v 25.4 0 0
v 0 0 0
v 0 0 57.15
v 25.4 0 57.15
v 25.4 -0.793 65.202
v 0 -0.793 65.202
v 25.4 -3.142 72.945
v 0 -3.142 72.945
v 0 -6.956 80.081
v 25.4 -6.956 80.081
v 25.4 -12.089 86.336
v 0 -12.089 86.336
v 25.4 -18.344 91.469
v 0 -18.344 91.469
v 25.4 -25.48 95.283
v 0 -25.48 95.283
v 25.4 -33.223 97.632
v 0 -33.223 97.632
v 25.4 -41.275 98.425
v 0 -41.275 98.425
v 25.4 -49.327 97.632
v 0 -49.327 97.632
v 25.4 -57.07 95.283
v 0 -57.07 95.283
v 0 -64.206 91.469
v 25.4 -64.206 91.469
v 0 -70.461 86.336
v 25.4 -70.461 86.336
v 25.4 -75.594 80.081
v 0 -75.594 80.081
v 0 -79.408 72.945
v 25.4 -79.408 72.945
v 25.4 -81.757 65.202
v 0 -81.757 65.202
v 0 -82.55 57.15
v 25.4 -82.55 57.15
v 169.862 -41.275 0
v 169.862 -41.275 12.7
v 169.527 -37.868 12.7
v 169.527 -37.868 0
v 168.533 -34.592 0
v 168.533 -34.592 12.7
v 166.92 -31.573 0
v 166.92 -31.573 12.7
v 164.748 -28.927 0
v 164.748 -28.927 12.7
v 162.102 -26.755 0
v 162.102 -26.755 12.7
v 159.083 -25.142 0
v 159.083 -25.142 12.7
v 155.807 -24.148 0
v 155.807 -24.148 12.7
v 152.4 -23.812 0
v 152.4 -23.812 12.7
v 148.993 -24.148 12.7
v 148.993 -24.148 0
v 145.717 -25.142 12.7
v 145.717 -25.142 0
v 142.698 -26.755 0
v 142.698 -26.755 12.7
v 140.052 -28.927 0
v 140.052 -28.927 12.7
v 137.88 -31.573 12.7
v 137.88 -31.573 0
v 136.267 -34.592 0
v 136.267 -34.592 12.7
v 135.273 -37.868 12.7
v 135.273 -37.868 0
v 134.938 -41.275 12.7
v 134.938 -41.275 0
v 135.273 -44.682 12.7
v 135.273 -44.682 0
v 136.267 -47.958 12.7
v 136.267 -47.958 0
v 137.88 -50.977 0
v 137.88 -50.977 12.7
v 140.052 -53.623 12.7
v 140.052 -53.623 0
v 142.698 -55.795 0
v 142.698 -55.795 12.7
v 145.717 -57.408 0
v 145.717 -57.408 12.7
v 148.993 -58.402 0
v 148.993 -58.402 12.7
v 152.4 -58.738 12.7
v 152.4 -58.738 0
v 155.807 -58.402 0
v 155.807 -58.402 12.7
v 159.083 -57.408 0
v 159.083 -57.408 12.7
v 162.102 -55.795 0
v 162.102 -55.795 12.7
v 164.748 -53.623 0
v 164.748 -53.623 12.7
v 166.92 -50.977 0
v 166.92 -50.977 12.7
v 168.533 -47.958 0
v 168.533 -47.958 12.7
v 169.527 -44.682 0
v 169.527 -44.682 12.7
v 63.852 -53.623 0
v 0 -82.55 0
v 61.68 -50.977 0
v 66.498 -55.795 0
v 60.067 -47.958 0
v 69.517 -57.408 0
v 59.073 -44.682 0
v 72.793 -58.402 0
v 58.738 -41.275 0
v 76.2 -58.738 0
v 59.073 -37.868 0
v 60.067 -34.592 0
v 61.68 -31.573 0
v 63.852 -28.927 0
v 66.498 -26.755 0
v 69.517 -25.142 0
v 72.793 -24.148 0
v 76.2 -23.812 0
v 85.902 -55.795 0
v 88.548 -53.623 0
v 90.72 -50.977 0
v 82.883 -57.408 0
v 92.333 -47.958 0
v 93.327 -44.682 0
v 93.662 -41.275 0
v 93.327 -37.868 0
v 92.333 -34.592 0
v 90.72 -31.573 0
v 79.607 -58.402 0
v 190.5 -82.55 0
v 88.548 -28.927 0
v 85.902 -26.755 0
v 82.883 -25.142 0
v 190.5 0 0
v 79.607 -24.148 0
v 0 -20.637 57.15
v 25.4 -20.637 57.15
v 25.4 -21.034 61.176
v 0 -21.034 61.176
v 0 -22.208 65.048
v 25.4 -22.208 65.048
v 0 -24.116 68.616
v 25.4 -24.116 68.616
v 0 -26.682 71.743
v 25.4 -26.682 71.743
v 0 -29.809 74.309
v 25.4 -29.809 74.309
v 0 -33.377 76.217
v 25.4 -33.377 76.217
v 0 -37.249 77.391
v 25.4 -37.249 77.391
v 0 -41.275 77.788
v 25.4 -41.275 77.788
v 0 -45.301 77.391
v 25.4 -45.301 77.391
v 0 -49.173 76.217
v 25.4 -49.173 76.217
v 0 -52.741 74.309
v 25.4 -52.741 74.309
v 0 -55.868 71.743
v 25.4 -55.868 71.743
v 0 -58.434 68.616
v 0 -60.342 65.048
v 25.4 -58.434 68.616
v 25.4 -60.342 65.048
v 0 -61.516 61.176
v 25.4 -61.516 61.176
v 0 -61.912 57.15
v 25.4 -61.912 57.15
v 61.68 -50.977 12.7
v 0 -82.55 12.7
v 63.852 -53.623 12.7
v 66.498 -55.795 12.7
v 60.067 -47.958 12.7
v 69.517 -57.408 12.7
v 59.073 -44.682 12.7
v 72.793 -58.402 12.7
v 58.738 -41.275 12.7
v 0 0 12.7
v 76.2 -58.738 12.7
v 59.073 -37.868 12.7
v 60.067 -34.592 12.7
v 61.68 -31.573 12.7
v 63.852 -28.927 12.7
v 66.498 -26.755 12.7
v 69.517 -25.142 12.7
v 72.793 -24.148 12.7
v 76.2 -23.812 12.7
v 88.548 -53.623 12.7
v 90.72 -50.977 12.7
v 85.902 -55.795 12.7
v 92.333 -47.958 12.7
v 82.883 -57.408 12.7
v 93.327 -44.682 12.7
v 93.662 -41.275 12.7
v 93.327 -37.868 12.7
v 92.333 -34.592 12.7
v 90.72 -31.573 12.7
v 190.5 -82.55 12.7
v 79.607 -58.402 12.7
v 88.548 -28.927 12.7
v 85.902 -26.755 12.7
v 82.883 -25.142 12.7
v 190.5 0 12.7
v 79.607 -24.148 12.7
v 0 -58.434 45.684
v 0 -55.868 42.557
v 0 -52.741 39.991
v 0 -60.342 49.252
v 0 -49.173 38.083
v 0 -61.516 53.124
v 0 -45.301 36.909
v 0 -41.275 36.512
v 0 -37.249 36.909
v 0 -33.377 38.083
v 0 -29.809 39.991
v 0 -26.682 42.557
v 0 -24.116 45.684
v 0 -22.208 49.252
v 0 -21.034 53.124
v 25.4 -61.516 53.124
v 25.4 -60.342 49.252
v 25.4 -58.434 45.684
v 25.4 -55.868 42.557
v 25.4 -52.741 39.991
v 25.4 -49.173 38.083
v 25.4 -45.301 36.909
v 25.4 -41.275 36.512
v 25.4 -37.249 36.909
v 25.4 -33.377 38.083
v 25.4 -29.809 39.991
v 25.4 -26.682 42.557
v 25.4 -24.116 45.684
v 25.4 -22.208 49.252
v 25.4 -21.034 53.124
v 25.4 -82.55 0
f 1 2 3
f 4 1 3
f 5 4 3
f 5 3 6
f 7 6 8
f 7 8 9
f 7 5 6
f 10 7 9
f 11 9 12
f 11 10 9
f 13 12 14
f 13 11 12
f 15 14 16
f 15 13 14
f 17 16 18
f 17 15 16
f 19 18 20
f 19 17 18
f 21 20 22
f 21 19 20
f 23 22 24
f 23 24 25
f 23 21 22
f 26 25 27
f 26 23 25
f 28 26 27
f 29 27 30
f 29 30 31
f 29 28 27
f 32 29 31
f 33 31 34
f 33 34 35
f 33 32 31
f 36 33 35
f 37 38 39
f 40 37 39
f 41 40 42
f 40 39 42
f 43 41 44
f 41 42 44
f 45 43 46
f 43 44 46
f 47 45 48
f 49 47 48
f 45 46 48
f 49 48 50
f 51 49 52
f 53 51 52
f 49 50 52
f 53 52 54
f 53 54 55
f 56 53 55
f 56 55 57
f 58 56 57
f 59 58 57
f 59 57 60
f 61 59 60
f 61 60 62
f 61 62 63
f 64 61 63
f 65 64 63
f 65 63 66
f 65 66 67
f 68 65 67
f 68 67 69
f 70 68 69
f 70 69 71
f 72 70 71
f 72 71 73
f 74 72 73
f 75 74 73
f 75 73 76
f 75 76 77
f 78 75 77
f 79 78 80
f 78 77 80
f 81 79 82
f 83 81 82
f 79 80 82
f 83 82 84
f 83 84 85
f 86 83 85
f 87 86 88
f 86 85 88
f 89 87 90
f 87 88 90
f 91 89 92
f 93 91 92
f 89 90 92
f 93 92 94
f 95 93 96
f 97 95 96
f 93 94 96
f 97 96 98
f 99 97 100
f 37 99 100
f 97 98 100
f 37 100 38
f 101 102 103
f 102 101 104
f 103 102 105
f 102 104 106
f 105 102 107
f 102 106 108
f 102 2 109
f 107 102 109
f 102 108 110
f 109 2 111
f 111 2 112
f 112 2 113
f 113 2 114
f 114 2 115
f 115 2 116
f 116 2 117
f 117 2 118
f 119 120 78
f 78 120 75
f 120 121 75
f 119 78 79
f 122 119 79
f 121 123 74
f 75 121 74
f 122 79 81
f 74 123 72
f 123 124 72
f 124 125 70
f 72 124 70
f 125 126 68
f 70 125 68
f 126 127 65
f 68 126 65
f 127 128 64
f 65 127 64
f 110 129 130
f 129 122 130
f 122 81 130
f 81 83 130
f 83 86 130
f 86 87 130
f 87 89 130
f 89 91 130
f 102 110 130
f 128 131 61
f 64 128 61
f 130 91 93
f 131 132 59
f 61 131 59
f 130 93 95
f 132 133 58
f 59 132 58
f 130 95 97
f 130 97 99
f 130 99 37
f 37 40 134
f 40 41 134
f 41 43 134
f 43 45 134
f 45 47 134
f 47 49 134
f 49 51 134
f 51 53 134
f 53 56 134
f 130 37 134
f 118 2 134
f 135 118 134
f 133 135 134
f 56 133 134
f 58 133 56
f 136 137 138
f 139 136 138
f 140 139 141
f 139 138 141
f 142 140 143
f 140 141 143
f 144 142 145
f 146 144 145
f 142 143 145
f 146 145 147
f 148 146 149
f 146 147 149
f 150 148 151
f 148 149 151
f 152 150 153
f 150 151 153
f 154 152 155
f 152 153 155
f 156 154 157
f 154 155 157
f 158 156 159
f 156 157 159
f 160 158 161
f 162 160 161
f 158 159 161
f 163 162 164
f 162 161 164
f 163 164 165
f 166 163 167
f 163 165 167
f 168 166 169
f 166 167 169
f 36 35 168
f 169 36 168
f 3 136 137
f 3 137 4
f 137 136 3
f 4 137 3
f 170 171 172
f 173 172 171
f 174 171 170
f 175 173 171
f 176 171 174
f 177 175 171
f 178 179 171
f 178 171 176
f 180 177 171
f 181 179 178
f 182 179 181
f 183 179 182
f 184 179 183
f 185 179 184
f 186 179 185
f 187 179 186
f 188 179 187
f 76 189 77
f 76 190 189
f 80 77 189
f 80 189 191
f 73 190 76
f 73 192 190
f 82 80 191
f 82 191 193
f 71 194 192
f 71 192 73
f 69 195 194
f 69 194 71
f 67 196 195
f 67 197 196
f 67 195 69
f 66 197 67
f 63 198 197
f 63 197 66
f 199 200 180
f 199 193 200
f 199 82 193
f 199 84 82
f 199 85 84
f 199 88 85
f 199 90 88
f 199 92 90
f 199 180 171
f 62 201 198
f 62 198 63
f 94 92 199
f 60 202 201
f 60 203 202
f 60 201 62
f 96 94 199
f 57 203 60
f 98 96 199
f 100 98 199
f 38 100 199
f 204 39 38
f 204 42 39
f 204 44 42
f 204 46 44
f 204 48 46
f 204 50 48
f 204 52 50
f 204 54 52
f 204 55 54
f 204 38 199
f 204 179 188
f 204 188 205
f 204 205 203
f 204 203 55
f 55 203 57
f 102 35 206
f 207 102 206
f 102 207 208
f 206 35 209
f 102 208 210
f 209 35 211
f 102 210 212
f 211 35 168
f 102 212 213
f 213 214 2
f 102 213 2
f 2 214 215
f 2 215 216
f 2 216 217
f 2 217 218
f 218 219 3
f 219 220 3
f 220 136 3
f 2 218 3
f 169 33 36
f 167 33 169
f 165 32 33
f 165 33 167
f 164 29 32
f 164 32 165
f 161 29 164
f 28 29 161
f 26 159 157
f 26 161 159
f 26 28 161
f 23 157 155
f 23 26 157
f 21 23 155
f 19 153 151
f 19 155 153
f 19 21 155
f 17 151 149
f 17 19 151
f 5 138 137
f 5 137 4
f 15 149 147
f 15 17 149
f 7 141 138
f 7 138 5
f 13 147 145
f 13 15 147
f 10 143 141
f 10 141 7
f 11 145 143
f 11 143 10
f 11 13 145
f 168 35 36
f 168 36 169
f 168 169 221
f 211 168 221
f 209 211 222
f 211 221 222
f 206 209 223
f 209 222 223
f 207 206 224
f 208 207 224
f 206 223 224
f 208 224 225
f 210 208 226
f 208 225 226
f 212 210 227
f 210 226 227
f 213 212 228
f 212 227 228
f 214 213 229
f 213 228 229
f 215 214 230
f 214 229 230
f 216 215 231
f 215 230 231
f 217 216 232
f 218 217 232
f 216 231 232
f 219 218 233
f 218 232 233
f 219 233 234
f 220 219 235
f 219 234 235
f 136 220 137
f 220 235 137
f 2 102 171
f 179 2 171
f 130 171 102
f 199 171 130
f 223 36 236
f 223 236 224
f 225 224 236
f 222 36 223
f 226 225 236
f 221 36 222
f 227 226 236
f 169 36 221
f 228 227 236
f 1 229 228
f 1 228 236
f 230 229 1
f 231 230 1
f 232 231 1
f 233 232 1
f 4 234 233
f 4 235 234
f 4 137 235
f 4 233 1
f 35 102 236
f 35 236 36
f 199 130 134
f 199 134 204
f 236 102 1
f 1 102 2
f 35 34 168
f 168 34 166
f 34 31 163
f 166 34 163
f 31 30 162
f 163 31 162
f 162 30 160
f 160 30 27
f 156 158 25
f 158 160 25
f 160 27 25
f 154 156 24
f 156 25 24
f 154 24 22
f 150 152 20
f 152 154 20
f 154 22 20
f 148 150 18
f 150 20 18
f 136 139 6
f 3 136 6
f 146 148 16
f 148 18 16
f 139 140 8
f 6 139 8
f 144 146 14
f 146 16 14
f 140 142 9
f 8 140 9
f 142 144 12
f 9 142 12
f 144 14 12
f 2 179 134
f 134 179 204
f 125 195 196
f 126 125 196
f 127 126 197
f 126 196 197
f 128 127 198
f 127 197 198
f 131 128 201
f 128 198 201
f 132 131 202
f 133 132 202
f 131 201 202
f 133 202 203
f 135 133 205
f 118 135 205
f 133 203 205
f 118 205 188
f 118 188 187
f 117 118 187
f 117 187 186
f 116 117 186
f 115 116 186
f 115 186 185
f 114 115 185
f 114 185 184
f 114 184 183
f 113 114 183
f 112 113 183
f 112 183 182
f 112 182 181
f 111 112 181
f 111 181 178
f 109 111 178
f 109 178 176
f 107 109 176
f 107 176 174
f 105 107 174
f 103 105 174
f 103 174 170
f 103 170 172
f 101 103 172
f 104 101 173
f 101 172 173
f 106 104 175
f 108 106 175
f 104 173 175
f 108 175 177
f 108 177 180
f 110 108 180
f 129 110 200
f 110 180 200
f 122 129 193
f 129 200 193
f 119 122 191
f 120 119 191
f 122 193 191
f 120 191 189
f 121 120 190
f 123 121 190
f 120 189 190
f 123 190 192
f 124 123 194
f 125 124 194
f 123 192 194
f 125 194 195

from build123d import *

# Parameters (mm, degrees)
F0_W      = 190.5
F0_H      = 12.7
F1_DEPTH  = 82.55
F2_W      = 82.55
F2_H      = 101.6
F3_DEPTH  = 25.4
F4_W      = 82.55
F4_H      = 44.45
F5_DEPTH  = 25.4
F7_DEPTH  = 25.4
F9_DEPTH  = 25.4
F10_DEPTH = 25.4
F11_R     = 17.4625
F12_DEPTH = 25.4


with BuildPart() as f1:
    # F0 (on Front) → F1 (new body)
    with BuildSketch(Plane.XZ):
        with Locations((95.25, 6.35)):
            Rectangle(F0_W, F0_H)
    extrude(amount=F1_DEPTH)

    # F11 (on face) → F12 (cut)
    with BuildSketch(Plane.XY.offset(12.7)):
        with Locations((152.4, -41.275)):
            Circle(F11_R)
        with Locations((76.2, -41.275)):
            Circle(F11_R)
    extrude(amount=-F12_DEPTH, mode=Mode.SUBTRACT)


with BuildPart() as f3:
    # F2 (on Right) → F3 (new body)
    with BuildSketch(Plane.YZ):
        with Locations((-41.275, 50.8)):
            Rectangle(F2_W, F2_H)
    extrude(amount=F3_DEPTH)

    # F4 (on face) → F5 (cut)
    with BuildSketch(Plane.YZ.offset(25.4)):
        with Locations((-41.275, 79.375)):
            Rectangle(F4_W, F4_H)
    extrude(amount=-F5_DEPTH, mode=Mode.SUBTRACT)

    # F8 (on face) → F10 (cut)
    with BuildSketch(Plane.YZ.offset(25.4)):
        with BuildLine():
            ThreePointArc((-61.9125, 57.15), (-41.275, 36.5125), (-20.6375, 57.15))
            Line((-20.6375, 57.15), (-61.9125, 57.15))
        make_face()
    extrude(amount=-F10_DEPTH, mode=Mode.SUBTRACT)


with BuildPart() as f7:
    # F6 (on face) → F7 (new body)
    with BuildSketch(Plane.YZ.offset(25.4)):
        with BuildLine():
            Line((-82.55, 57.15), (0, 57.15))
            ThreePointArc((0, 57.15), (-41.275, 98.425), (-82.55, 57.15))
        make_face()
    extrude(amount=-F7_DEPTH)

    # F8 (on face) → F9 (cut)
    with BuildSketch(Plane.YZ.offset(25.4)):
        with BuildLine():
            Line((-61.9125, 57.15), (-20.6375, 57.15))
            ThreePointArc((-20.6375, 57.15), (-41.275, 77.7875), (-61.9125, 57.15))
        make_face()
    extrude(amount=-F9_DEPTH, mode=Mode.SUBTRACT)


solid = Compound([f1.part, f3.part, f7.part])
